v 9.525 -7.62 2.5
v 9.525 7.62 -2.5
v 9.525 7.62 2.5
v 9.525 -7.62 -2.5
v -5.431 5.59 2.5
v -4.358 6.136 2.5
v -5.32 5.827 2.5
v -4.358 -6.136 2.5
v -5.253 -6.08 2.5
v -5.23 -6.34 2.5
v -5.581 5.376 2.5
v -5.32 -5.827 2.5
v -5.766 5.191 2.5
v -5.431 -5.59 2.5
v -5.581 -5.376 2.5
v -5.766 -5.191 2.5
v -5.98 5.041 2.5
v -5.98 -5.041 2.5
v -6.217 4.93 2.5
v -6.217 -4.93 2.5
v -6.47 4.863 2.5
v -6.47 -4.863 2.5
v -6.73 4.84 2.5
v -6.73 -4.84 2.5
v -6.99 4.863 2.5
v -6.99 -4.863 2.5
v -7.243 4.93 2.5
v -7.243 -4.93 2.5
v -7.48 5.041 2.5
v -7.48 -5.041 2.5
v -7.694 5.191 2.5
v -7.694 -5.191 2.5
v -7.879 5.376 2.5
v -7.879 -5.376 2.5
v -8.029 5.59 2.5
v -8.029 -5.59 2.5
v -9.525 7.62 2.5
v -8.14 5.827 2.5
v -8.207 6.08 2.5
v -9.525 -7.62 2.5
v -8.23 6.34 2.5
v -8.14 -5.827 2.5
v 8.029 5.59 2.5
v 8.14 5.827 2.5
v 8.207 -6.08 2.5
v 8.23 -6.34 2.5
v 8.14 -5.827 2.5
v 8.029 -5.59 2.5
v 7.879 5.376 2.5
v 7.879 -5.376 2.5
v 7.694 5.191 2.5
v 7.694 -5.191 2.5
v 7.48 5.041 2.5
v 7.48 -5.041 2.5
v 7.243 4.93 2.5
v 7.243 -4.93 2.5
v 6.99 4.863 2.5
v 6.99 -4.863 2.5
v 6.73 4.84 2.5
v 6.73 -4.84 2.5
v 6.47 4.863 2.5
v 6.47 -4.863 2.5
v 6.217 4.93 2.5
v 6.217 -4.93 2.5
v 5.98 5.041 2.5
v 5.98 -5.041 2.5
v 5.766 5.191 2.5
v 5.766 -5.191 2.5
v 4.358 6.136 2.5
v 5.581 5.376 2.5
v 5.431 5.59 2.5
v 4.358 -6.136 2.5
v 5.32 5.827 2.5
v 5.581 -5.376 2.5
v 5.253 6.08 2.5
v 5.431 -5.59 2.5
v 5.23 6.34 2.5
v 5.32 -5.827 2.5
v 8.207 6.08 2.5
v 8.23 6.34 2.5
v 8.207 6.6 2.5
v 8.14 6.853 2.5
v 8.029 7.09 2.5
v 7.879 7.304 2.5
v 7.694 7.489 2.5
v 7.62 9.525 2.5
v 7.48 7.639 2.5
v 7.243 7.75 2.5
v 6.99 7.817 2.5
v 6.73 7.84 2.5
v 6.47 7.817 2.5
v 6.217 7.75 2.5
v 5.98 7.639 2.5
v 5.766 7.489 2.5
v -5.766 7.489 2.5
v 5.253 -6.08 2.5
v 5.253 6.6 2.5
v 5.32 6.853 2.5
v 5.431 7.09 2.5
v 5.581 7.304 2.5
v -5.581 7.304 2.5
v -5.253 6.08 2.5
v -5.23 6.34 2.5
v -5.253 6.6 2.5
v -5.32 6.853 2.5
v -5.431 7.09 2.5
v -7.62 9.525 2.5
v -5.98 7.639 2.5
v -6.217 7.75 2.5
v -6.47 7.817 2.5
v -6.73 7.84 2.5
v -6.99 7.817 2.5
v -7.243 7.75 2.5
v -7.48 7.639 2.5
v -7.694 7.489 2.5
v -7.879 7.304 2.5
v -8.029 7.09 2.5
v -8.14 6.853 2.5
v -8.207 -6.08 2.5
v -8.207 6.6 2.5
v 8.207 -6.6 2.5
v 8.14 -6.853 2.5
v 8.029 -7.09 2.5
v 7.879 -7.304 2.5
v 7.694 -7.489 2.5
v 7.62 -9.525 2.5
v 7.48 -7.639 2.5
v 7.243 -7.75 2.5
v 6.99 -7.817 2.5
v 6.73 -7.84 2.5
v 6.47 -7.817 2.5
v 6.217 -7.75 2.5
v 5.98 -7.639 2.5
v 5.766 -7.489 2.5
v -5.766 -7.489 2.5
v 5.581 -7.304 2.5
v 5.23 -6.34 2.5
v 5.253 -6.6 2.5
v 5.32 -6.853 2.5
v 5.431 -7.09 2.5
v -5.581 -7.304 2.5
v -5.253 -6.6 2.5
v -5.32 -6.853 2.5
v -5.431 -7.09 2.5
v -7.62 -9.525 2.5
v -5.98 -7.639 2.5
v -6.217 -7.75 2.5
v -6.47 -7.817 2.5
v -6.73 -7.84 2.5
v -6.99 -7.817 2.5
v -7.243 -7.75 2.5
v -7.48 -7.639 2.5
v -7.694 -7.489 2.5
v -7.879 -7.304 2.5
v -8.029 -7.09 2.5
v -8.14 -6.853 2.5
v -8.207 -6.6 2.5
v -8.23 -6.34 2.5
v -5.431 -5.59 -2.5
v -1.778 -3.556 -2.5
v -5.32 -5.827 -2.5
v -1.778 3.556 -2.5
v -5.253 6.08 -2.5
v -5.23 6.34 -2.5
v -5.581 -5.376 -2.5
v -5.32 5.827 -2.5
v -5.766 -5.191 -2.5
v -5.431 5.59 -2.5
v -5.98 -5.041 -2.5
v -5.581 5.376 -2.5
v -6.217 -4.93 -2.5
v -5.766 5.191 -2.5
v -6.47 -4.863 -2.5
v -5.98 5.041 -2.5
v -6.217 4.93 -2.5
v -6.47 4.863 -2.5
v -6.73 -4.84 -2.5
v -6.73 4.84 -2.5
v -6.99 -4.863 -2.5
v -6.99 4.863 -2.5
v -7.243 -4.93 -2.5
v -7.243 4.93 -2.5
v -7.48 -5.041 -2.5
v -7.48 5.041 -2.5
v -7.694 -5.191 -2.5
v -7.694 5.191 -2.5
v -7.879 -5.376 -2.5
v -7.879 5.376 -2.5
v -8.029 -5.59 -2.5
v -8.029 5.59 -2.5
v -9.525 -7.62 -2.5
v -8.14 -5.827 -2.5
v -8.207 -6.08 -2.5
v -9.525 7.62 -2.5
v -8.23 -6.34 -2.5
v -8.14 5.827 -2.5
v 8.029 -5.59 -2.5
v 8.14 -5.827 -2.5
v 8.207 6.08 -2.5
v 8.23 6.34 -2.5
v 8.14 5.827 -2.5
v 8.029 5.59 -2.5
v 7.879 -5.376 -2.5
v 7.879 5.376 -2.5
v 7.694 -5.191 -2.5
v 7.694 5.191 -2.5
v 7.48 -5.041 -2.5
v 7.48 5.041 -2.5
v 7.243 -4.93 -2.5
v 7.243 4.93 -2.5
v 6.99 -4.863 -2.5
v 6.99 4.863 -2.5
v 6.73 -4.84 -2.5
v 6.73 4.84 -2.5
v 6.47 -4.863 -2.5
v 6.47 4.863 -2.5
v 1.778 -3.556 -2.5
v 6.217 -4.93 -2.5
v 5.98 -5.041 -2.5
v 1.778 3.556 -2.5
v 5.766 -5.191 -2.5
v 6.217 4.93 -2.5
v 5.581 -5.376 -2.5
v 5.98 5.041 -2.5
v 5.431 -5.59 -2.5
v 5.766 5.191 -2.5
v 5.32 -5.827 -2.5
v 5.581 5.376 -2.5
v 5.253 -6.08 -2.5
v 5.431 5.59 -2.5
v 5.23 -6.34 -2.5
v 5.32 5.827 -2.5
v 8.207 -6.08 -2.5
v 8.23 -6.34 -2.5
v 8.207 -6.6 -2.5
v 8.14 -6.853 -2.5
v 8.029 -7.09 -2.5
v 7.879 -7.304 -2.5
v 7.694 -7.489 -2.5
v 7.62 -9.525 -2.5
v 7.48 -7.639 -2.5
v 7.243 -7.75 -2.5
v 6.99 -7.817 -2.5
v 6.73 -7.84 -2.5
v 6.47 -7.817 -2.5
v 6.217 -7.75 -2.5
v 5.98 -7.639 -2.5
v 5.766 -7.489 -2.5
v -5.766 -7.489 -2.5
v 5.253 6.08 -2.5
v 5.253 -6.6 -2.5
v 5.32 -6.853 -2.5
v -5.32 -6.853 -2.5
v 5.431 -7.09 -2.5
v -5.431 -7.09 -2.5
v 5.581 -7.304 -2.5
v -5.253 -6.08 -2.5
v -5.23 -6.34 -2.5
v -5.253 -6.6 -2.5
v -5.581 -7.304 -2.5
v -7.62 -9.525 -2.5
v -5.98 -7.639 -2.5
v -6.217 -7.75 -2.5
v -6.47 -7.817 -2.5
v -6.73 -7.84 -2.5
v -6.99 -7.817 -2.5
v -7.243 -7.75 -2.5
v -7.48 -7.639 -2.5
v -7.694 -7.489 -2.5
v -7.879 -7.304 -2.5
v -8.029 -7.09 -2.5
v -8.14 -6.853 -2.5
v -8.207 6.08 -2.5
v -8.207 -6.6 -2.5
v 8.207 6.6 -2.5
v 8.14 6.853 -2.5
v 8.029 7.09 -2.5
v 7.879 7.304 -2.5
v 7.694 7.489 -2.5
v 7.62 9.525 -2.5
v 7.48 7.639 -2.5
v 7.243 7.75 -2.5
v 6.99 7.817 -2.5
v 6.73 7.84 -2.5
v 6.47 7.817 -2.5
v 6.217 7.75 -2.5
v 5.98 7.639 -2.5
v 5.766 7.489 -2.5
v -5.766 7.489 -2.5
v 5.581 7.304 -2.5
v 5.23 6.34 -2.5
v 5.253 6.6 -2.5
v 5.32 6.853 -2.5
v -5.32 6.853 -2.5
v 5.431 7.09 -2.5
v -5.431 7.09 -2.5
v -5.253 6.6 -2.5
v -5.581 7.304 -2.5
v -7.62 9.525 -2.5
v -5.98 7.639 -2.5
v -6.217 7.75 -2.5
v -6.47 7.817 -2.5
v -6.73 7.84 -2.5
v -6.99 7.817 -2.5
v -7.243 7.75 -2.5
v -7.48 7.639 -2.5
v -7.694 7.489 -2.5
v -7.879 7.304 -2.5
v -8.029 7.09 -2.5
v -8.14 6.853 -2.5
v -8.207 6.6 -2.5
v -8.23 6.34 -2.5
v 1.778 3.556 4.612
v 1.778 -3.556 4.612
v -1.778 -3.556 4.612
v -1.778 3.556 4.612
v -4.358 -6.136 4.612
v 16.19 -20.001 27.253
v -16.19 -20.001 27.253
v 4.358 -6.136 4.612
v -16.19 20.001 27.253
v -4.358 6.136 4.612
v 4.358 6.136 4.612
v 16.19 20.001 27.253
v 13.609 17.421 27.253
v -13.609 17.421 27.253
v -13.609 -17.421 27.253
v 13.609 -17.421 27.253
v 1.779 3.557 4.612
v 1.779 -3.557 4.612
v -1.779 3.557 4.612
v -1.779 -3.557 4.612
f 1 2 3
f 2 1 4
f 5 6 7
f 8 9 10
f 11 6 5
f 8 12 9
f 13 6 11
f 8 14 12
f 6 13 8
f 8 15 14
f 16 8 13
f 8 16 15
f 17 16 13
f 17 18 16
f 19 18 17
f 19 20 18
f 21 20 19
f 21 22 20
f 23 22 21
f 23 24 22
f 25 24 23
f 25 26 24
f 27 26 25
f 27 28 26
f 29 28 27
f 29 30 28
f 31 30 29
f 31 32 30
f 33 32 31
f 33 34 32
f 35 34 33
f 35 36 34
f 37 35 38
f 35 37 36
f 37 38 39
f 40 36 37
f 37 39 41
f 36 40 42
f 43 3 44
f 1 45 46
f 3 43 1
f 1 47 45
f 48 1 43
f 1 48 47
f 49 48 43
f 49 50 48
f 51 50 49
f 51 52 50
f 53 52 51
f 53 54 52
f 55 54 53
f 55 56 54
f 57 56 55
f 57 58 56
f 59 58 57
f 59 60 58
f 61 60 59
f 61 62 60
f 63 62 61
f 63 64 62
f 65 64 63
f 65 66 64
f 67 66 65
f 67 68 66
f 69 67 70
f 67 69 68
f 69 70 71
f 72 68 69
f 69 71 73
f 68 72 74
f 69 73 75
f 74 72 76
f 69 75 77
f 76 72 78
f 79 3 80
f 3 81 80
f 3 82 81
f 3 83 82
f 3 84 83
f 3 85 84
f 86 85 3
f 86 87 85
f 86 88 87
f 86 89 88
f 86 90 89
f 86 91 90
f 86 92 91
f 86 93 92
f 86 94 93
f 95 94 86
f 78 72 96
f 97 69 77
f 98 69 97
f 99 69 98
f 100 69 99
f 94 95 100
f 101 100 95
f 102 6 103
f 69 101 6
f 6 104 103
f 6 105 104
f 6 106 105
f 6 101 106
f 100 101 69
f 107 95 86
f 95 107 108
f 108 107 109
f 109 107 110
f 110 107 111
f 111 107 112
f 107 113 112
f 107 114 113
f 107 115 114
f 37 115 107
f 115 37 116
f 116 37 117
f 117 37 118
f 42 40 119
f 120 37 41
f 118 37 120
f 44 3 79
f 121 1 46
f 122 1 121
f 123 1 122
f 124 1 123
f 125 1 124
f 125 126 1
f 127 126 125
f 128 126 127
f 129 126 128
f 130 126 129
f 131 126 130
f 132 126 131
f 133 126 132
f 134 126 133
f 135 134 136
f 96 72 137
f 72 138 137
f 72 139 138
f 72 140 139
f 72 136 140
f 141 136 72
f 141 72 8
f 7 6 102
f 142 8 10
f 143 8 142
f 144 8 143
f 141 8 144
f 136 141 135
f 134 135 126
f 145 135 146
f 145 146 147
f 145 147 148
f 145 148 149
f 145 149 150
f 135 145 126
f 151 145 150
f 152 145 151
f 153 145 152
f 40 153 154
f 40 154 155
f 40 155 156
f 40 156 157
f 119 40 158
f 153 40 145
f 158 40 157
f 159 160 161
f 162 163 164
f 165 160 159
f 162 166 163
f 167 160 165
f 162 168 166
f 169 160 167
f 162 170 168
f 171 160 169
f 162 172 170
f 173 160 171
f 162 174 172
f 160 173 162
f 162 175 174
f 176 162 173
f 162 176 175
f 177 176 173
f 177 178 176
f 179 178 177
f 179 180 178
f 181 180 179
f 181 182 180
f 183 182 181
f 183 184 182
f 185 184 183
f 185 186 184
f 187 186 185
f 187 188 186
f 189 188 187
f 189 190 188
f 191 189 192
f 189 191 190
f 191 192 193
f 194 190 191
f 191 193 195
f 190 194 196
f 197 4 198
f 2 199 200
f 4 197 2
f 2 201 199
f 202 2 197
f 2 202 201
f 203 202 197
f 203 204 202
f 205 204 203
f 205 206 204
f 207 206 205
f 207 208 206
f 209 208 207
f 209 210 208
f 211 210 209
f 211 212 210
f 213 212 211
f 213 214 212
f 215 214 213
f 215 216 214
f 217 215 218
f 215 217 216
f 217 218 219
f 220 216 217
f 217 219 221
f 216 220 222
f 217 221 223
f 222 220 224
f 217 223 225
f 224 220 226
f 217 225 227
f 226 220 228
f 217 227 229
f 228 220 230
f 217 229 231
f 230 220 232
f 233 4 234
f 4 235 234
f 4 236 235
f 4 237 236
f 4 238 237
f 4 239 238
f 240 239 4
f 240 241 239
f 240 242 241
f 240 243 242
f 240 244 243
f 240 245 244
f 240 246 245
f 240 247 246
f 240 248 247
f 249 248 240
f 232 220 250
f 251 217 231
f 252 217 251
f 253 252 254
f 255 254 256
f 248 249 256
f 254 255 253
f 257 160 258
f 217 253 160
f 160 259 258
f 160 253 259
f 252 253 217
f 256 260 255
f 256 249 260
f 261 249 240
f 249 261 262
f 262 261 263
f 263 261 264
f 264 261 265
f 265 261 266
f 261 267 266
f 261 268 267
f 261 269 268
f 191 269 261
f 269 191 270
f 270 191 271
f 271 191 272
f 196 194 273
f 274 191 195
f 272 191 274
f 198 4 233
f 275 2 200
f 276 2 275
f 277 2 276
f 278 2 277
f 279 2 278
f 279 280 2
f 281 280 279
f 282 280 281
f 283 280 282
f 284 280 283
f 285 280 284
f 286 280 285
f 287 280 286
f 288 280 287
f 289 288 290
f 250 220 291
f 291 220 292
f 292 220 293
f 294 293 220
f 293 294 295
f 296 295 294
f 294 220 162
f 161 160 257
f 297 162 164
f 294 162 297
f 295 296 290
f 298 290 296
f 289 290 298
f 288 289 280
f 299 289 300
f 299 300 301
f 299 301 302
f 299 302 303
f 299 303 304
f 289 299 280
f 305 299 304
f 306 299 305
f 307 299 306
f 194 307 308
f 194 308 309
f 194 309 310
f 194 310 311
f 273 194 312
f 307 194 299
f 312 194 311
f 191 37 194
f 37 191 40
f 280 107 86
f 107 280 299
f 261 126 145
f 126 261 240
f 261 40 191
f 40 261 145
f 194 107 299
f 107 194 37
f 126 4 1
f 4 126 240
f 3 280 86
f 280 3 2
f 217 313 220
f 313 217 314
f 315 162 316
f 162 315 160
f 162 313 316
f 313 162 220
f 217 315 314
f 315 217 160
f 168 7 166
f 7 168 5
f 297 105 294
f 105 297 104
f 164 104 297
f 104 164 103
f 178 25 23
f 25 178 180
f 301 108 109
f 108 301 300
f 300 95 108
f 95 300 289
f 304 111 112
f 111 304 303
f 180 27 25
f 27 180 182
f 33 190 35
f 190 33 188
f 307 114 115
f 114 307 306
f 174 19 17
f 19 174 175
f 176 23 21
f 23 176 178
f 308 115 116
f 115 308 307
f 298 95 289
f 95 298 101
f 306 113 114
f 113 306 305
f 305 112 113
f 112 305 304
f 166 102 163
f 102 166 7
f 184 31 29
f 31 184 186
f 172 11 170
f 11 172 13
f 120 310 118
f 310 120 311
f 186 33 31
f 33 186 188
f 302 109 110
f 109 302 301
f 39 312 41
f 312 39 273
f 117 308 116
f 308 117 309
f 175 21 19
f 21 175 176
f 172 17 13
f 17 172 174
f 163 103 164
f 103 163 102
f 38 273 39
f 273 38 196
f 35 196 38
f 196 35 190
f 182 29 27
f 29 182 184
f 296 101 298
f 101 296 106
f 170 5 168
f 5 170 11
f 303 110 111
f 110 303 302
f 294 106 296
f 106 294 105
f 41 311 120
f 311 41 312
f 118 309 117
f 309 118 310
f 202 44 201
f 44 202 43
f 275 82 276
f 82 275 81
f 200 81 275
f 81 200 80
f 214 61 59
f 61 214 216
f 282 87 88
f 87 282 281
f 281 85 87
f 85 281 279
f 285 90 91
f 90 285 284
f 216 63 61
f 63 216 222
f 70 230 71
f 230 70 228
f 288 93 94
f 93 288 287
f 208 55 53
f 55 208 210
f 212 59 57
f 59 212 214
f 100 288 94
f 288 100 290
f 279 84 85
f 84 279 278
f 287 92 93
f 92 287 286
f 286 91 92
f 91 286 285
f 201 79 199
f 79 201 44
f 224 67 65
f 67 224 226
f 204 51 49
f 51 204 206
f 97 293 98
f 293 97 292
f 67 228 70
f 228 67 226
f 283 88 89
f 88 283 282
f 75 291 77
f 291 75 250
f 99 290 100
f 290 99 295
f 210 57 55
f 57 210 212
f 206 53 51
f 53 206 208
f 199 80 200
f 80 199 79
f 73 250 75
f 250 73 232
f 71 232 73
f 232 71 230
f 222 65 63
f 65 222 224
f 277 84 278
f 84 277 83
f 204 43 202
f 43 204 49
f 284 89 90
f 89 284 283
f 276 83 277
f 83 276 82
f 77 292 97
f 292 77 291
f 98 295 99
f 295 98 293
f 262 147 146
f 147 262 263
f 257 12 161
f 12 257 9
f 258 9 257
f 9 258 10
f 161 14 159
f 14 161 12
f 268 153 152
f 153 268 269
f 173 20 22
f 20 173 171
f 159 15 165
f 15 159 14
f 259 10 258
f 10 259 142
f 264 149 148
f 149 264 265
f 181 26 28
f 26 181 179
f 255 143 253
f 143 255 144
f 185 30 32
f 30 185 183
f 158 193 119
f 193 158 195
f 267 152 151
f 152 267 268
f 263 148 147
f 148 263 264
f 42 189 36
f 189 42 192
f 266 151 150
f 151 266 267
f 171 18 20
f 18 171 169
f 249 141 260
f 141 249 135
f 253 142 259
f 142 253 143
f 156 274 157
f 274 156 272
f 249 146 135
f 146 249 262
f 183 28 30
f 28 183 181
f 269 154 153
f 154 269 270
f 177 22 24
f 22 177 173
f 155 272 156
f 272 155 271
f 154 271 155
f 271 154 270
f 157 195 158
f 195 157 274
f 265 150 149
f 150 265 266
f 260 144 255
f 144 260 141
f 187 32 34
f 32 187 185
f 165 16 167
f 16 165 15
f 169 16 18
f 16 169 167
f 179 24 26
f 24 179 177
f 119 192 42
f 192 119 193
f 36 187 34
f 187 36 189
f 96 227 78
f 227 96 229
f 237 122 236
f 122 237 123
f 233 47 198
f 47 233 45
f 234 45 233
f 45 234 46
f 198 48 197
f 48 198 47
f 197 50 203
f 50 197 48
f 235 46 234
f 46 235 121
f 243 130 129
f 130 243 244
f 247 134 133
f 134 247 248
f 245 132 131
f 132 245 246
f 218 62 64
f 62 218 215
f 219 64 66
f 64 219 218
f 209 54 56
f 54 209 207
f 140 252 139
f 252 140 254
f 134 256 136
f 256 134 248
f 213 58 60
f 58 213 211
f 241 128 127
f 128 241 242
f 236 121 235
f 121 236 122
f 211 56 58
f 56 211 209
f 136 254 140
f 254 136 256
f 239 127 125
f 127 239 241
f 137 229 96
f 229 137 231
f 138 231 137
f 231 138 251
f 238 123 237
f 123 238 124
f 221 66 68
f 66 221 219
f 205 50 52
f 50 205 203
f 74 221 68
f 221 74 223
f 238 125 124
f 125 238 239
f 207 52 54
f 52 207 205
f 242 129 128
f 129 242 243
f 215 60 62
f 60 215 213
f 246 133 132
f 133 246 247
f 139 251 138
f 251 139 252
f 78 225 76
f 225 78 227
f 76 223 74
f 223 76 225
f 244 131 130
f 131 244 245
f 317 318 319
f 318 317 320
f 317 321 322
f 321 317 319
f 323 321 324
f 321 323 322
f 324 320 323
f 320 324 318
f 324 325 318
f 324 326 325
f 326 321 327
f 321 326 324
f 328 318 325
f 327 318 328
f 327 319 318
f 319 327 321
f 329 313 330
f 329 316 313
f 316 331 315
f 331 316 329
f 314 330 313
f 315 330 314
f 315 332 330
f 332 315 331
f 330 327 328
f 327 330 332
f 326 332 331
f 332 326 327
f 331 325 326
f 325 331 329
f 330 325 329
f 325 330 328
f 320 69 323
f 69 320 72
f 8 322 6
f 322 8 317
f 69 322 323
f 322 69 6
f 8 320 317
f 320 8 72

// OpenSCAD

// *************************************************************
// (C) 2013 Dipl.Ing. Rolf-Dieter Klein, Munich Germany
// OpenSource -- would be great to keep my name as reference
// HORN ANTENNA for Microwaves -- use copper to metallize
// or use for metal casting !!
// www.rdklein.de
// report error, problems to rdklein@rdklein.de
// *************************************************************
// WR Flange Code 
wrcode = 8; // [1:WR112,2:WR90,3:WR75,4:WR62,5:WR51,6:WR42,7:WR34,8:WR28]
//
// overall wall thickness in mm
wall = 2.58; // 
// flange thickness
flanged = 5; // flange thickness
//
// Antennalenght multiplier R0 = Lambda * n
multin = 2; // default 2Lambda

// addon in lamba/2 units flanged is subtracted ! !
waveadd = 1;  

// standard dimension tables
// WR cannot be entered directly due to openscad variable restrictions
// a case of if for assignment cannot be used, index is easier for this.
// WR 112 7.05-10.00 GHz
// WR 90  8.20-12.40 GHz
// WR 75  10.00-15.00 GHz
// WR 62  12.49-18.00 GHz
// WR 51  15.00-22.00 GHz
// WR 42  18.00-26.50 GHz
// WR 34  22.00-33.00 GHz
// WR 28  26.50-40.00 GHz
//
// do not change:
wrtab = [0,112,90,75,62,51,42,34,28]*1.0;
// do not change:
atab = [0,47.9,41.4,38.3,33.3,31.0,22.41,22.1,19.05]*1.0;
// do not change:
etab = [0,18.72,16.26,14.25,12.14,11.25,8.51,7.9,6.73]*1.0;
// do not change:
ftab = [0,17.17,15.49,13.21,12.63,10.29,8.13,7.5,6.34]*1.0;
// do not change:
drilltab=[0,4.3,4.3,4.1,4.1,4.1,3.1,3.1,3.0]*1.0;
// dann werte zuweisen
// ueber index
sizea = atab[wrcode]; // square size of flange
sizee = etab[wrcode]; // holes from smaller 
sizef = ftab[wrcode]; // holes from larger 
drill = drilltab[wrcode]/2.0; // drill for flange mounting
wr = wrtab[wrcode];
lquat = wr/20.0*2.54; // lamba 4 in mm
//

// faces for precision
$fn=36; // faces for precision
//
// *********** FLANGE ****************
// Draw A Flange with mounting holes
// now with separate thickness.
difference() {
 difference() {
 	intersection() {

		cube([sizea,sizea,flanged],center=true);
		rotate([0,0,45]) cube([sizea*1.4142*0.9,sizea*1.4142*0.9,flanged],center=true);
	}
	cube([lquat,lquat*2,wall*2],center=true);
 } 
 translate([-sizee,sizef,0]) cylinder(h=flanged*2,r=drill,center=true);
 translate([sizee,sizef,0]) cylinder(h=flanged*2,r=drill,center=true);
 translate([-sizee,-sizef,0]) cylinder(h=flanged*2,r=drill,center=true);
 translate([sizee,-sizef,0]) cylinder(h=flanged*2,r=drill,center=true);
}
//
// ***** HORN ANTENNA *****
// Pyramidal Horn
// r0 = length to pyramidal joint point
//
r0 = multin * lquat * 4; // lambda * 4 * multiplier for r0
Asize = sqrt(3*lquat*4*r0); // Size in H plane direction
//
// *** if preferred Bsize = sqrt(2*lquat*4*r0); // Size in E plane direction
//
a = lquat*2; // simpler for calc below
b = lquat;
// ********* rh and re now the base... one can be choosen
// optimal horn is for re=rh
// 
Bsize = 1/2*(b + sqrt(b*b+(8*Asize*(Asize-a)/3) ));
//
echo(r0);
echo(Asize);
//
lh = sqrt(r0*r0+(Asize*Asize)/4);
rh = Asize*( (Asize- a)/(3*lquat*4));

// rh = (Asize- a)*sqrt((lh/Asize)-1/4);
// le = sqrt(r0*r0+(Bsize*Bsize)/4);
// re = (Bsize- b)*sqrt((le/Bsize)-1/4);
// 
 
rh1 = rh * 1.00001; // for boolean problems to be solved
offset1 = -0.001+0.0;

// 
wa1= wall;
// wall thickness not alongside, but if needed:
// alpha = atan(Asize/(2*r0));
// wa1 = wall/cos(alpha);
// echo("alpha",alpha,"walpha=",wa1);
//
// Outer Polygon
 difference() {
translate([0,0,-flanged/2+lquat*2*waveadd]) polyhedron(
  points=[ [Bsize/2+wa1,Asize/2+wa1,rh],[Bsize/2+wa1,-Asize/2-wa1,rh],[-Bsize/2-wa1,-Asize/2-wa1,rh],[-Bsize/2-wa1,Asize/2+wa1,rh], /// the four points at base
           [b/2+wa1,wa1+a/2,0],[b/2+wa1,-wa1-a/2,0],[-wa1-b/2,-wa1-a/2,0],[-wa1-b/2,wa1+a/2,0]  ],                                 // the apex point 
  triangles=[ [0,1,4],[1,2,5],[2,3,6],[3,0,7],          // each triangle side
				   [1,5,4],[2,6,5],[3,7,6],[0,4,7],
              [1,0,3],[2,1,3],[4,5,7],[5,6,7]  ]                         // two triangles for square base
 );
// b in x a in y
// inner polygon for subtration...

translate([0,0,-flanged/2+lquat*2*waveadd]) polyhedron(
  points=[ [Bsize/2,Asize/2,rh1],[Bsize/2,-Asize/2,rh1],[-Bsize/2,-Asize/2,rh1],[-Bsize/2,Asize/2,rh1], /// the four points at base
           [b/2,a/2,offset1],[b/2,-a/2,offset1],[-b/2,-a/2,offset1],[-b/2,a/2,offset1]  ],                                 // the apex point 
  triangles=[ [0,1,4],[1,2,5],[2,3,6],[3,0,7],          // each triangle side
				   [1,5,4],[2,6,5],[3,7,6],[0,4,7],
              [1,0,3],[2,1,3],[4,5,7],[5,6,7]  ]                         // two triangles for square
);
}
// Additional wavequide 
difference() {
 translate([0,0,-flanged/2+lquat*waveadd]) cube([lquat+wall*2,lquat*2+wall*2,lquat*2*waveadd],center=true);
 translate([0,0,-flanged/2+lquat*waveadd]) cube([lquat,lquat*2,lquat*2*waveadd+wall*3],center=true);
}
//


 
